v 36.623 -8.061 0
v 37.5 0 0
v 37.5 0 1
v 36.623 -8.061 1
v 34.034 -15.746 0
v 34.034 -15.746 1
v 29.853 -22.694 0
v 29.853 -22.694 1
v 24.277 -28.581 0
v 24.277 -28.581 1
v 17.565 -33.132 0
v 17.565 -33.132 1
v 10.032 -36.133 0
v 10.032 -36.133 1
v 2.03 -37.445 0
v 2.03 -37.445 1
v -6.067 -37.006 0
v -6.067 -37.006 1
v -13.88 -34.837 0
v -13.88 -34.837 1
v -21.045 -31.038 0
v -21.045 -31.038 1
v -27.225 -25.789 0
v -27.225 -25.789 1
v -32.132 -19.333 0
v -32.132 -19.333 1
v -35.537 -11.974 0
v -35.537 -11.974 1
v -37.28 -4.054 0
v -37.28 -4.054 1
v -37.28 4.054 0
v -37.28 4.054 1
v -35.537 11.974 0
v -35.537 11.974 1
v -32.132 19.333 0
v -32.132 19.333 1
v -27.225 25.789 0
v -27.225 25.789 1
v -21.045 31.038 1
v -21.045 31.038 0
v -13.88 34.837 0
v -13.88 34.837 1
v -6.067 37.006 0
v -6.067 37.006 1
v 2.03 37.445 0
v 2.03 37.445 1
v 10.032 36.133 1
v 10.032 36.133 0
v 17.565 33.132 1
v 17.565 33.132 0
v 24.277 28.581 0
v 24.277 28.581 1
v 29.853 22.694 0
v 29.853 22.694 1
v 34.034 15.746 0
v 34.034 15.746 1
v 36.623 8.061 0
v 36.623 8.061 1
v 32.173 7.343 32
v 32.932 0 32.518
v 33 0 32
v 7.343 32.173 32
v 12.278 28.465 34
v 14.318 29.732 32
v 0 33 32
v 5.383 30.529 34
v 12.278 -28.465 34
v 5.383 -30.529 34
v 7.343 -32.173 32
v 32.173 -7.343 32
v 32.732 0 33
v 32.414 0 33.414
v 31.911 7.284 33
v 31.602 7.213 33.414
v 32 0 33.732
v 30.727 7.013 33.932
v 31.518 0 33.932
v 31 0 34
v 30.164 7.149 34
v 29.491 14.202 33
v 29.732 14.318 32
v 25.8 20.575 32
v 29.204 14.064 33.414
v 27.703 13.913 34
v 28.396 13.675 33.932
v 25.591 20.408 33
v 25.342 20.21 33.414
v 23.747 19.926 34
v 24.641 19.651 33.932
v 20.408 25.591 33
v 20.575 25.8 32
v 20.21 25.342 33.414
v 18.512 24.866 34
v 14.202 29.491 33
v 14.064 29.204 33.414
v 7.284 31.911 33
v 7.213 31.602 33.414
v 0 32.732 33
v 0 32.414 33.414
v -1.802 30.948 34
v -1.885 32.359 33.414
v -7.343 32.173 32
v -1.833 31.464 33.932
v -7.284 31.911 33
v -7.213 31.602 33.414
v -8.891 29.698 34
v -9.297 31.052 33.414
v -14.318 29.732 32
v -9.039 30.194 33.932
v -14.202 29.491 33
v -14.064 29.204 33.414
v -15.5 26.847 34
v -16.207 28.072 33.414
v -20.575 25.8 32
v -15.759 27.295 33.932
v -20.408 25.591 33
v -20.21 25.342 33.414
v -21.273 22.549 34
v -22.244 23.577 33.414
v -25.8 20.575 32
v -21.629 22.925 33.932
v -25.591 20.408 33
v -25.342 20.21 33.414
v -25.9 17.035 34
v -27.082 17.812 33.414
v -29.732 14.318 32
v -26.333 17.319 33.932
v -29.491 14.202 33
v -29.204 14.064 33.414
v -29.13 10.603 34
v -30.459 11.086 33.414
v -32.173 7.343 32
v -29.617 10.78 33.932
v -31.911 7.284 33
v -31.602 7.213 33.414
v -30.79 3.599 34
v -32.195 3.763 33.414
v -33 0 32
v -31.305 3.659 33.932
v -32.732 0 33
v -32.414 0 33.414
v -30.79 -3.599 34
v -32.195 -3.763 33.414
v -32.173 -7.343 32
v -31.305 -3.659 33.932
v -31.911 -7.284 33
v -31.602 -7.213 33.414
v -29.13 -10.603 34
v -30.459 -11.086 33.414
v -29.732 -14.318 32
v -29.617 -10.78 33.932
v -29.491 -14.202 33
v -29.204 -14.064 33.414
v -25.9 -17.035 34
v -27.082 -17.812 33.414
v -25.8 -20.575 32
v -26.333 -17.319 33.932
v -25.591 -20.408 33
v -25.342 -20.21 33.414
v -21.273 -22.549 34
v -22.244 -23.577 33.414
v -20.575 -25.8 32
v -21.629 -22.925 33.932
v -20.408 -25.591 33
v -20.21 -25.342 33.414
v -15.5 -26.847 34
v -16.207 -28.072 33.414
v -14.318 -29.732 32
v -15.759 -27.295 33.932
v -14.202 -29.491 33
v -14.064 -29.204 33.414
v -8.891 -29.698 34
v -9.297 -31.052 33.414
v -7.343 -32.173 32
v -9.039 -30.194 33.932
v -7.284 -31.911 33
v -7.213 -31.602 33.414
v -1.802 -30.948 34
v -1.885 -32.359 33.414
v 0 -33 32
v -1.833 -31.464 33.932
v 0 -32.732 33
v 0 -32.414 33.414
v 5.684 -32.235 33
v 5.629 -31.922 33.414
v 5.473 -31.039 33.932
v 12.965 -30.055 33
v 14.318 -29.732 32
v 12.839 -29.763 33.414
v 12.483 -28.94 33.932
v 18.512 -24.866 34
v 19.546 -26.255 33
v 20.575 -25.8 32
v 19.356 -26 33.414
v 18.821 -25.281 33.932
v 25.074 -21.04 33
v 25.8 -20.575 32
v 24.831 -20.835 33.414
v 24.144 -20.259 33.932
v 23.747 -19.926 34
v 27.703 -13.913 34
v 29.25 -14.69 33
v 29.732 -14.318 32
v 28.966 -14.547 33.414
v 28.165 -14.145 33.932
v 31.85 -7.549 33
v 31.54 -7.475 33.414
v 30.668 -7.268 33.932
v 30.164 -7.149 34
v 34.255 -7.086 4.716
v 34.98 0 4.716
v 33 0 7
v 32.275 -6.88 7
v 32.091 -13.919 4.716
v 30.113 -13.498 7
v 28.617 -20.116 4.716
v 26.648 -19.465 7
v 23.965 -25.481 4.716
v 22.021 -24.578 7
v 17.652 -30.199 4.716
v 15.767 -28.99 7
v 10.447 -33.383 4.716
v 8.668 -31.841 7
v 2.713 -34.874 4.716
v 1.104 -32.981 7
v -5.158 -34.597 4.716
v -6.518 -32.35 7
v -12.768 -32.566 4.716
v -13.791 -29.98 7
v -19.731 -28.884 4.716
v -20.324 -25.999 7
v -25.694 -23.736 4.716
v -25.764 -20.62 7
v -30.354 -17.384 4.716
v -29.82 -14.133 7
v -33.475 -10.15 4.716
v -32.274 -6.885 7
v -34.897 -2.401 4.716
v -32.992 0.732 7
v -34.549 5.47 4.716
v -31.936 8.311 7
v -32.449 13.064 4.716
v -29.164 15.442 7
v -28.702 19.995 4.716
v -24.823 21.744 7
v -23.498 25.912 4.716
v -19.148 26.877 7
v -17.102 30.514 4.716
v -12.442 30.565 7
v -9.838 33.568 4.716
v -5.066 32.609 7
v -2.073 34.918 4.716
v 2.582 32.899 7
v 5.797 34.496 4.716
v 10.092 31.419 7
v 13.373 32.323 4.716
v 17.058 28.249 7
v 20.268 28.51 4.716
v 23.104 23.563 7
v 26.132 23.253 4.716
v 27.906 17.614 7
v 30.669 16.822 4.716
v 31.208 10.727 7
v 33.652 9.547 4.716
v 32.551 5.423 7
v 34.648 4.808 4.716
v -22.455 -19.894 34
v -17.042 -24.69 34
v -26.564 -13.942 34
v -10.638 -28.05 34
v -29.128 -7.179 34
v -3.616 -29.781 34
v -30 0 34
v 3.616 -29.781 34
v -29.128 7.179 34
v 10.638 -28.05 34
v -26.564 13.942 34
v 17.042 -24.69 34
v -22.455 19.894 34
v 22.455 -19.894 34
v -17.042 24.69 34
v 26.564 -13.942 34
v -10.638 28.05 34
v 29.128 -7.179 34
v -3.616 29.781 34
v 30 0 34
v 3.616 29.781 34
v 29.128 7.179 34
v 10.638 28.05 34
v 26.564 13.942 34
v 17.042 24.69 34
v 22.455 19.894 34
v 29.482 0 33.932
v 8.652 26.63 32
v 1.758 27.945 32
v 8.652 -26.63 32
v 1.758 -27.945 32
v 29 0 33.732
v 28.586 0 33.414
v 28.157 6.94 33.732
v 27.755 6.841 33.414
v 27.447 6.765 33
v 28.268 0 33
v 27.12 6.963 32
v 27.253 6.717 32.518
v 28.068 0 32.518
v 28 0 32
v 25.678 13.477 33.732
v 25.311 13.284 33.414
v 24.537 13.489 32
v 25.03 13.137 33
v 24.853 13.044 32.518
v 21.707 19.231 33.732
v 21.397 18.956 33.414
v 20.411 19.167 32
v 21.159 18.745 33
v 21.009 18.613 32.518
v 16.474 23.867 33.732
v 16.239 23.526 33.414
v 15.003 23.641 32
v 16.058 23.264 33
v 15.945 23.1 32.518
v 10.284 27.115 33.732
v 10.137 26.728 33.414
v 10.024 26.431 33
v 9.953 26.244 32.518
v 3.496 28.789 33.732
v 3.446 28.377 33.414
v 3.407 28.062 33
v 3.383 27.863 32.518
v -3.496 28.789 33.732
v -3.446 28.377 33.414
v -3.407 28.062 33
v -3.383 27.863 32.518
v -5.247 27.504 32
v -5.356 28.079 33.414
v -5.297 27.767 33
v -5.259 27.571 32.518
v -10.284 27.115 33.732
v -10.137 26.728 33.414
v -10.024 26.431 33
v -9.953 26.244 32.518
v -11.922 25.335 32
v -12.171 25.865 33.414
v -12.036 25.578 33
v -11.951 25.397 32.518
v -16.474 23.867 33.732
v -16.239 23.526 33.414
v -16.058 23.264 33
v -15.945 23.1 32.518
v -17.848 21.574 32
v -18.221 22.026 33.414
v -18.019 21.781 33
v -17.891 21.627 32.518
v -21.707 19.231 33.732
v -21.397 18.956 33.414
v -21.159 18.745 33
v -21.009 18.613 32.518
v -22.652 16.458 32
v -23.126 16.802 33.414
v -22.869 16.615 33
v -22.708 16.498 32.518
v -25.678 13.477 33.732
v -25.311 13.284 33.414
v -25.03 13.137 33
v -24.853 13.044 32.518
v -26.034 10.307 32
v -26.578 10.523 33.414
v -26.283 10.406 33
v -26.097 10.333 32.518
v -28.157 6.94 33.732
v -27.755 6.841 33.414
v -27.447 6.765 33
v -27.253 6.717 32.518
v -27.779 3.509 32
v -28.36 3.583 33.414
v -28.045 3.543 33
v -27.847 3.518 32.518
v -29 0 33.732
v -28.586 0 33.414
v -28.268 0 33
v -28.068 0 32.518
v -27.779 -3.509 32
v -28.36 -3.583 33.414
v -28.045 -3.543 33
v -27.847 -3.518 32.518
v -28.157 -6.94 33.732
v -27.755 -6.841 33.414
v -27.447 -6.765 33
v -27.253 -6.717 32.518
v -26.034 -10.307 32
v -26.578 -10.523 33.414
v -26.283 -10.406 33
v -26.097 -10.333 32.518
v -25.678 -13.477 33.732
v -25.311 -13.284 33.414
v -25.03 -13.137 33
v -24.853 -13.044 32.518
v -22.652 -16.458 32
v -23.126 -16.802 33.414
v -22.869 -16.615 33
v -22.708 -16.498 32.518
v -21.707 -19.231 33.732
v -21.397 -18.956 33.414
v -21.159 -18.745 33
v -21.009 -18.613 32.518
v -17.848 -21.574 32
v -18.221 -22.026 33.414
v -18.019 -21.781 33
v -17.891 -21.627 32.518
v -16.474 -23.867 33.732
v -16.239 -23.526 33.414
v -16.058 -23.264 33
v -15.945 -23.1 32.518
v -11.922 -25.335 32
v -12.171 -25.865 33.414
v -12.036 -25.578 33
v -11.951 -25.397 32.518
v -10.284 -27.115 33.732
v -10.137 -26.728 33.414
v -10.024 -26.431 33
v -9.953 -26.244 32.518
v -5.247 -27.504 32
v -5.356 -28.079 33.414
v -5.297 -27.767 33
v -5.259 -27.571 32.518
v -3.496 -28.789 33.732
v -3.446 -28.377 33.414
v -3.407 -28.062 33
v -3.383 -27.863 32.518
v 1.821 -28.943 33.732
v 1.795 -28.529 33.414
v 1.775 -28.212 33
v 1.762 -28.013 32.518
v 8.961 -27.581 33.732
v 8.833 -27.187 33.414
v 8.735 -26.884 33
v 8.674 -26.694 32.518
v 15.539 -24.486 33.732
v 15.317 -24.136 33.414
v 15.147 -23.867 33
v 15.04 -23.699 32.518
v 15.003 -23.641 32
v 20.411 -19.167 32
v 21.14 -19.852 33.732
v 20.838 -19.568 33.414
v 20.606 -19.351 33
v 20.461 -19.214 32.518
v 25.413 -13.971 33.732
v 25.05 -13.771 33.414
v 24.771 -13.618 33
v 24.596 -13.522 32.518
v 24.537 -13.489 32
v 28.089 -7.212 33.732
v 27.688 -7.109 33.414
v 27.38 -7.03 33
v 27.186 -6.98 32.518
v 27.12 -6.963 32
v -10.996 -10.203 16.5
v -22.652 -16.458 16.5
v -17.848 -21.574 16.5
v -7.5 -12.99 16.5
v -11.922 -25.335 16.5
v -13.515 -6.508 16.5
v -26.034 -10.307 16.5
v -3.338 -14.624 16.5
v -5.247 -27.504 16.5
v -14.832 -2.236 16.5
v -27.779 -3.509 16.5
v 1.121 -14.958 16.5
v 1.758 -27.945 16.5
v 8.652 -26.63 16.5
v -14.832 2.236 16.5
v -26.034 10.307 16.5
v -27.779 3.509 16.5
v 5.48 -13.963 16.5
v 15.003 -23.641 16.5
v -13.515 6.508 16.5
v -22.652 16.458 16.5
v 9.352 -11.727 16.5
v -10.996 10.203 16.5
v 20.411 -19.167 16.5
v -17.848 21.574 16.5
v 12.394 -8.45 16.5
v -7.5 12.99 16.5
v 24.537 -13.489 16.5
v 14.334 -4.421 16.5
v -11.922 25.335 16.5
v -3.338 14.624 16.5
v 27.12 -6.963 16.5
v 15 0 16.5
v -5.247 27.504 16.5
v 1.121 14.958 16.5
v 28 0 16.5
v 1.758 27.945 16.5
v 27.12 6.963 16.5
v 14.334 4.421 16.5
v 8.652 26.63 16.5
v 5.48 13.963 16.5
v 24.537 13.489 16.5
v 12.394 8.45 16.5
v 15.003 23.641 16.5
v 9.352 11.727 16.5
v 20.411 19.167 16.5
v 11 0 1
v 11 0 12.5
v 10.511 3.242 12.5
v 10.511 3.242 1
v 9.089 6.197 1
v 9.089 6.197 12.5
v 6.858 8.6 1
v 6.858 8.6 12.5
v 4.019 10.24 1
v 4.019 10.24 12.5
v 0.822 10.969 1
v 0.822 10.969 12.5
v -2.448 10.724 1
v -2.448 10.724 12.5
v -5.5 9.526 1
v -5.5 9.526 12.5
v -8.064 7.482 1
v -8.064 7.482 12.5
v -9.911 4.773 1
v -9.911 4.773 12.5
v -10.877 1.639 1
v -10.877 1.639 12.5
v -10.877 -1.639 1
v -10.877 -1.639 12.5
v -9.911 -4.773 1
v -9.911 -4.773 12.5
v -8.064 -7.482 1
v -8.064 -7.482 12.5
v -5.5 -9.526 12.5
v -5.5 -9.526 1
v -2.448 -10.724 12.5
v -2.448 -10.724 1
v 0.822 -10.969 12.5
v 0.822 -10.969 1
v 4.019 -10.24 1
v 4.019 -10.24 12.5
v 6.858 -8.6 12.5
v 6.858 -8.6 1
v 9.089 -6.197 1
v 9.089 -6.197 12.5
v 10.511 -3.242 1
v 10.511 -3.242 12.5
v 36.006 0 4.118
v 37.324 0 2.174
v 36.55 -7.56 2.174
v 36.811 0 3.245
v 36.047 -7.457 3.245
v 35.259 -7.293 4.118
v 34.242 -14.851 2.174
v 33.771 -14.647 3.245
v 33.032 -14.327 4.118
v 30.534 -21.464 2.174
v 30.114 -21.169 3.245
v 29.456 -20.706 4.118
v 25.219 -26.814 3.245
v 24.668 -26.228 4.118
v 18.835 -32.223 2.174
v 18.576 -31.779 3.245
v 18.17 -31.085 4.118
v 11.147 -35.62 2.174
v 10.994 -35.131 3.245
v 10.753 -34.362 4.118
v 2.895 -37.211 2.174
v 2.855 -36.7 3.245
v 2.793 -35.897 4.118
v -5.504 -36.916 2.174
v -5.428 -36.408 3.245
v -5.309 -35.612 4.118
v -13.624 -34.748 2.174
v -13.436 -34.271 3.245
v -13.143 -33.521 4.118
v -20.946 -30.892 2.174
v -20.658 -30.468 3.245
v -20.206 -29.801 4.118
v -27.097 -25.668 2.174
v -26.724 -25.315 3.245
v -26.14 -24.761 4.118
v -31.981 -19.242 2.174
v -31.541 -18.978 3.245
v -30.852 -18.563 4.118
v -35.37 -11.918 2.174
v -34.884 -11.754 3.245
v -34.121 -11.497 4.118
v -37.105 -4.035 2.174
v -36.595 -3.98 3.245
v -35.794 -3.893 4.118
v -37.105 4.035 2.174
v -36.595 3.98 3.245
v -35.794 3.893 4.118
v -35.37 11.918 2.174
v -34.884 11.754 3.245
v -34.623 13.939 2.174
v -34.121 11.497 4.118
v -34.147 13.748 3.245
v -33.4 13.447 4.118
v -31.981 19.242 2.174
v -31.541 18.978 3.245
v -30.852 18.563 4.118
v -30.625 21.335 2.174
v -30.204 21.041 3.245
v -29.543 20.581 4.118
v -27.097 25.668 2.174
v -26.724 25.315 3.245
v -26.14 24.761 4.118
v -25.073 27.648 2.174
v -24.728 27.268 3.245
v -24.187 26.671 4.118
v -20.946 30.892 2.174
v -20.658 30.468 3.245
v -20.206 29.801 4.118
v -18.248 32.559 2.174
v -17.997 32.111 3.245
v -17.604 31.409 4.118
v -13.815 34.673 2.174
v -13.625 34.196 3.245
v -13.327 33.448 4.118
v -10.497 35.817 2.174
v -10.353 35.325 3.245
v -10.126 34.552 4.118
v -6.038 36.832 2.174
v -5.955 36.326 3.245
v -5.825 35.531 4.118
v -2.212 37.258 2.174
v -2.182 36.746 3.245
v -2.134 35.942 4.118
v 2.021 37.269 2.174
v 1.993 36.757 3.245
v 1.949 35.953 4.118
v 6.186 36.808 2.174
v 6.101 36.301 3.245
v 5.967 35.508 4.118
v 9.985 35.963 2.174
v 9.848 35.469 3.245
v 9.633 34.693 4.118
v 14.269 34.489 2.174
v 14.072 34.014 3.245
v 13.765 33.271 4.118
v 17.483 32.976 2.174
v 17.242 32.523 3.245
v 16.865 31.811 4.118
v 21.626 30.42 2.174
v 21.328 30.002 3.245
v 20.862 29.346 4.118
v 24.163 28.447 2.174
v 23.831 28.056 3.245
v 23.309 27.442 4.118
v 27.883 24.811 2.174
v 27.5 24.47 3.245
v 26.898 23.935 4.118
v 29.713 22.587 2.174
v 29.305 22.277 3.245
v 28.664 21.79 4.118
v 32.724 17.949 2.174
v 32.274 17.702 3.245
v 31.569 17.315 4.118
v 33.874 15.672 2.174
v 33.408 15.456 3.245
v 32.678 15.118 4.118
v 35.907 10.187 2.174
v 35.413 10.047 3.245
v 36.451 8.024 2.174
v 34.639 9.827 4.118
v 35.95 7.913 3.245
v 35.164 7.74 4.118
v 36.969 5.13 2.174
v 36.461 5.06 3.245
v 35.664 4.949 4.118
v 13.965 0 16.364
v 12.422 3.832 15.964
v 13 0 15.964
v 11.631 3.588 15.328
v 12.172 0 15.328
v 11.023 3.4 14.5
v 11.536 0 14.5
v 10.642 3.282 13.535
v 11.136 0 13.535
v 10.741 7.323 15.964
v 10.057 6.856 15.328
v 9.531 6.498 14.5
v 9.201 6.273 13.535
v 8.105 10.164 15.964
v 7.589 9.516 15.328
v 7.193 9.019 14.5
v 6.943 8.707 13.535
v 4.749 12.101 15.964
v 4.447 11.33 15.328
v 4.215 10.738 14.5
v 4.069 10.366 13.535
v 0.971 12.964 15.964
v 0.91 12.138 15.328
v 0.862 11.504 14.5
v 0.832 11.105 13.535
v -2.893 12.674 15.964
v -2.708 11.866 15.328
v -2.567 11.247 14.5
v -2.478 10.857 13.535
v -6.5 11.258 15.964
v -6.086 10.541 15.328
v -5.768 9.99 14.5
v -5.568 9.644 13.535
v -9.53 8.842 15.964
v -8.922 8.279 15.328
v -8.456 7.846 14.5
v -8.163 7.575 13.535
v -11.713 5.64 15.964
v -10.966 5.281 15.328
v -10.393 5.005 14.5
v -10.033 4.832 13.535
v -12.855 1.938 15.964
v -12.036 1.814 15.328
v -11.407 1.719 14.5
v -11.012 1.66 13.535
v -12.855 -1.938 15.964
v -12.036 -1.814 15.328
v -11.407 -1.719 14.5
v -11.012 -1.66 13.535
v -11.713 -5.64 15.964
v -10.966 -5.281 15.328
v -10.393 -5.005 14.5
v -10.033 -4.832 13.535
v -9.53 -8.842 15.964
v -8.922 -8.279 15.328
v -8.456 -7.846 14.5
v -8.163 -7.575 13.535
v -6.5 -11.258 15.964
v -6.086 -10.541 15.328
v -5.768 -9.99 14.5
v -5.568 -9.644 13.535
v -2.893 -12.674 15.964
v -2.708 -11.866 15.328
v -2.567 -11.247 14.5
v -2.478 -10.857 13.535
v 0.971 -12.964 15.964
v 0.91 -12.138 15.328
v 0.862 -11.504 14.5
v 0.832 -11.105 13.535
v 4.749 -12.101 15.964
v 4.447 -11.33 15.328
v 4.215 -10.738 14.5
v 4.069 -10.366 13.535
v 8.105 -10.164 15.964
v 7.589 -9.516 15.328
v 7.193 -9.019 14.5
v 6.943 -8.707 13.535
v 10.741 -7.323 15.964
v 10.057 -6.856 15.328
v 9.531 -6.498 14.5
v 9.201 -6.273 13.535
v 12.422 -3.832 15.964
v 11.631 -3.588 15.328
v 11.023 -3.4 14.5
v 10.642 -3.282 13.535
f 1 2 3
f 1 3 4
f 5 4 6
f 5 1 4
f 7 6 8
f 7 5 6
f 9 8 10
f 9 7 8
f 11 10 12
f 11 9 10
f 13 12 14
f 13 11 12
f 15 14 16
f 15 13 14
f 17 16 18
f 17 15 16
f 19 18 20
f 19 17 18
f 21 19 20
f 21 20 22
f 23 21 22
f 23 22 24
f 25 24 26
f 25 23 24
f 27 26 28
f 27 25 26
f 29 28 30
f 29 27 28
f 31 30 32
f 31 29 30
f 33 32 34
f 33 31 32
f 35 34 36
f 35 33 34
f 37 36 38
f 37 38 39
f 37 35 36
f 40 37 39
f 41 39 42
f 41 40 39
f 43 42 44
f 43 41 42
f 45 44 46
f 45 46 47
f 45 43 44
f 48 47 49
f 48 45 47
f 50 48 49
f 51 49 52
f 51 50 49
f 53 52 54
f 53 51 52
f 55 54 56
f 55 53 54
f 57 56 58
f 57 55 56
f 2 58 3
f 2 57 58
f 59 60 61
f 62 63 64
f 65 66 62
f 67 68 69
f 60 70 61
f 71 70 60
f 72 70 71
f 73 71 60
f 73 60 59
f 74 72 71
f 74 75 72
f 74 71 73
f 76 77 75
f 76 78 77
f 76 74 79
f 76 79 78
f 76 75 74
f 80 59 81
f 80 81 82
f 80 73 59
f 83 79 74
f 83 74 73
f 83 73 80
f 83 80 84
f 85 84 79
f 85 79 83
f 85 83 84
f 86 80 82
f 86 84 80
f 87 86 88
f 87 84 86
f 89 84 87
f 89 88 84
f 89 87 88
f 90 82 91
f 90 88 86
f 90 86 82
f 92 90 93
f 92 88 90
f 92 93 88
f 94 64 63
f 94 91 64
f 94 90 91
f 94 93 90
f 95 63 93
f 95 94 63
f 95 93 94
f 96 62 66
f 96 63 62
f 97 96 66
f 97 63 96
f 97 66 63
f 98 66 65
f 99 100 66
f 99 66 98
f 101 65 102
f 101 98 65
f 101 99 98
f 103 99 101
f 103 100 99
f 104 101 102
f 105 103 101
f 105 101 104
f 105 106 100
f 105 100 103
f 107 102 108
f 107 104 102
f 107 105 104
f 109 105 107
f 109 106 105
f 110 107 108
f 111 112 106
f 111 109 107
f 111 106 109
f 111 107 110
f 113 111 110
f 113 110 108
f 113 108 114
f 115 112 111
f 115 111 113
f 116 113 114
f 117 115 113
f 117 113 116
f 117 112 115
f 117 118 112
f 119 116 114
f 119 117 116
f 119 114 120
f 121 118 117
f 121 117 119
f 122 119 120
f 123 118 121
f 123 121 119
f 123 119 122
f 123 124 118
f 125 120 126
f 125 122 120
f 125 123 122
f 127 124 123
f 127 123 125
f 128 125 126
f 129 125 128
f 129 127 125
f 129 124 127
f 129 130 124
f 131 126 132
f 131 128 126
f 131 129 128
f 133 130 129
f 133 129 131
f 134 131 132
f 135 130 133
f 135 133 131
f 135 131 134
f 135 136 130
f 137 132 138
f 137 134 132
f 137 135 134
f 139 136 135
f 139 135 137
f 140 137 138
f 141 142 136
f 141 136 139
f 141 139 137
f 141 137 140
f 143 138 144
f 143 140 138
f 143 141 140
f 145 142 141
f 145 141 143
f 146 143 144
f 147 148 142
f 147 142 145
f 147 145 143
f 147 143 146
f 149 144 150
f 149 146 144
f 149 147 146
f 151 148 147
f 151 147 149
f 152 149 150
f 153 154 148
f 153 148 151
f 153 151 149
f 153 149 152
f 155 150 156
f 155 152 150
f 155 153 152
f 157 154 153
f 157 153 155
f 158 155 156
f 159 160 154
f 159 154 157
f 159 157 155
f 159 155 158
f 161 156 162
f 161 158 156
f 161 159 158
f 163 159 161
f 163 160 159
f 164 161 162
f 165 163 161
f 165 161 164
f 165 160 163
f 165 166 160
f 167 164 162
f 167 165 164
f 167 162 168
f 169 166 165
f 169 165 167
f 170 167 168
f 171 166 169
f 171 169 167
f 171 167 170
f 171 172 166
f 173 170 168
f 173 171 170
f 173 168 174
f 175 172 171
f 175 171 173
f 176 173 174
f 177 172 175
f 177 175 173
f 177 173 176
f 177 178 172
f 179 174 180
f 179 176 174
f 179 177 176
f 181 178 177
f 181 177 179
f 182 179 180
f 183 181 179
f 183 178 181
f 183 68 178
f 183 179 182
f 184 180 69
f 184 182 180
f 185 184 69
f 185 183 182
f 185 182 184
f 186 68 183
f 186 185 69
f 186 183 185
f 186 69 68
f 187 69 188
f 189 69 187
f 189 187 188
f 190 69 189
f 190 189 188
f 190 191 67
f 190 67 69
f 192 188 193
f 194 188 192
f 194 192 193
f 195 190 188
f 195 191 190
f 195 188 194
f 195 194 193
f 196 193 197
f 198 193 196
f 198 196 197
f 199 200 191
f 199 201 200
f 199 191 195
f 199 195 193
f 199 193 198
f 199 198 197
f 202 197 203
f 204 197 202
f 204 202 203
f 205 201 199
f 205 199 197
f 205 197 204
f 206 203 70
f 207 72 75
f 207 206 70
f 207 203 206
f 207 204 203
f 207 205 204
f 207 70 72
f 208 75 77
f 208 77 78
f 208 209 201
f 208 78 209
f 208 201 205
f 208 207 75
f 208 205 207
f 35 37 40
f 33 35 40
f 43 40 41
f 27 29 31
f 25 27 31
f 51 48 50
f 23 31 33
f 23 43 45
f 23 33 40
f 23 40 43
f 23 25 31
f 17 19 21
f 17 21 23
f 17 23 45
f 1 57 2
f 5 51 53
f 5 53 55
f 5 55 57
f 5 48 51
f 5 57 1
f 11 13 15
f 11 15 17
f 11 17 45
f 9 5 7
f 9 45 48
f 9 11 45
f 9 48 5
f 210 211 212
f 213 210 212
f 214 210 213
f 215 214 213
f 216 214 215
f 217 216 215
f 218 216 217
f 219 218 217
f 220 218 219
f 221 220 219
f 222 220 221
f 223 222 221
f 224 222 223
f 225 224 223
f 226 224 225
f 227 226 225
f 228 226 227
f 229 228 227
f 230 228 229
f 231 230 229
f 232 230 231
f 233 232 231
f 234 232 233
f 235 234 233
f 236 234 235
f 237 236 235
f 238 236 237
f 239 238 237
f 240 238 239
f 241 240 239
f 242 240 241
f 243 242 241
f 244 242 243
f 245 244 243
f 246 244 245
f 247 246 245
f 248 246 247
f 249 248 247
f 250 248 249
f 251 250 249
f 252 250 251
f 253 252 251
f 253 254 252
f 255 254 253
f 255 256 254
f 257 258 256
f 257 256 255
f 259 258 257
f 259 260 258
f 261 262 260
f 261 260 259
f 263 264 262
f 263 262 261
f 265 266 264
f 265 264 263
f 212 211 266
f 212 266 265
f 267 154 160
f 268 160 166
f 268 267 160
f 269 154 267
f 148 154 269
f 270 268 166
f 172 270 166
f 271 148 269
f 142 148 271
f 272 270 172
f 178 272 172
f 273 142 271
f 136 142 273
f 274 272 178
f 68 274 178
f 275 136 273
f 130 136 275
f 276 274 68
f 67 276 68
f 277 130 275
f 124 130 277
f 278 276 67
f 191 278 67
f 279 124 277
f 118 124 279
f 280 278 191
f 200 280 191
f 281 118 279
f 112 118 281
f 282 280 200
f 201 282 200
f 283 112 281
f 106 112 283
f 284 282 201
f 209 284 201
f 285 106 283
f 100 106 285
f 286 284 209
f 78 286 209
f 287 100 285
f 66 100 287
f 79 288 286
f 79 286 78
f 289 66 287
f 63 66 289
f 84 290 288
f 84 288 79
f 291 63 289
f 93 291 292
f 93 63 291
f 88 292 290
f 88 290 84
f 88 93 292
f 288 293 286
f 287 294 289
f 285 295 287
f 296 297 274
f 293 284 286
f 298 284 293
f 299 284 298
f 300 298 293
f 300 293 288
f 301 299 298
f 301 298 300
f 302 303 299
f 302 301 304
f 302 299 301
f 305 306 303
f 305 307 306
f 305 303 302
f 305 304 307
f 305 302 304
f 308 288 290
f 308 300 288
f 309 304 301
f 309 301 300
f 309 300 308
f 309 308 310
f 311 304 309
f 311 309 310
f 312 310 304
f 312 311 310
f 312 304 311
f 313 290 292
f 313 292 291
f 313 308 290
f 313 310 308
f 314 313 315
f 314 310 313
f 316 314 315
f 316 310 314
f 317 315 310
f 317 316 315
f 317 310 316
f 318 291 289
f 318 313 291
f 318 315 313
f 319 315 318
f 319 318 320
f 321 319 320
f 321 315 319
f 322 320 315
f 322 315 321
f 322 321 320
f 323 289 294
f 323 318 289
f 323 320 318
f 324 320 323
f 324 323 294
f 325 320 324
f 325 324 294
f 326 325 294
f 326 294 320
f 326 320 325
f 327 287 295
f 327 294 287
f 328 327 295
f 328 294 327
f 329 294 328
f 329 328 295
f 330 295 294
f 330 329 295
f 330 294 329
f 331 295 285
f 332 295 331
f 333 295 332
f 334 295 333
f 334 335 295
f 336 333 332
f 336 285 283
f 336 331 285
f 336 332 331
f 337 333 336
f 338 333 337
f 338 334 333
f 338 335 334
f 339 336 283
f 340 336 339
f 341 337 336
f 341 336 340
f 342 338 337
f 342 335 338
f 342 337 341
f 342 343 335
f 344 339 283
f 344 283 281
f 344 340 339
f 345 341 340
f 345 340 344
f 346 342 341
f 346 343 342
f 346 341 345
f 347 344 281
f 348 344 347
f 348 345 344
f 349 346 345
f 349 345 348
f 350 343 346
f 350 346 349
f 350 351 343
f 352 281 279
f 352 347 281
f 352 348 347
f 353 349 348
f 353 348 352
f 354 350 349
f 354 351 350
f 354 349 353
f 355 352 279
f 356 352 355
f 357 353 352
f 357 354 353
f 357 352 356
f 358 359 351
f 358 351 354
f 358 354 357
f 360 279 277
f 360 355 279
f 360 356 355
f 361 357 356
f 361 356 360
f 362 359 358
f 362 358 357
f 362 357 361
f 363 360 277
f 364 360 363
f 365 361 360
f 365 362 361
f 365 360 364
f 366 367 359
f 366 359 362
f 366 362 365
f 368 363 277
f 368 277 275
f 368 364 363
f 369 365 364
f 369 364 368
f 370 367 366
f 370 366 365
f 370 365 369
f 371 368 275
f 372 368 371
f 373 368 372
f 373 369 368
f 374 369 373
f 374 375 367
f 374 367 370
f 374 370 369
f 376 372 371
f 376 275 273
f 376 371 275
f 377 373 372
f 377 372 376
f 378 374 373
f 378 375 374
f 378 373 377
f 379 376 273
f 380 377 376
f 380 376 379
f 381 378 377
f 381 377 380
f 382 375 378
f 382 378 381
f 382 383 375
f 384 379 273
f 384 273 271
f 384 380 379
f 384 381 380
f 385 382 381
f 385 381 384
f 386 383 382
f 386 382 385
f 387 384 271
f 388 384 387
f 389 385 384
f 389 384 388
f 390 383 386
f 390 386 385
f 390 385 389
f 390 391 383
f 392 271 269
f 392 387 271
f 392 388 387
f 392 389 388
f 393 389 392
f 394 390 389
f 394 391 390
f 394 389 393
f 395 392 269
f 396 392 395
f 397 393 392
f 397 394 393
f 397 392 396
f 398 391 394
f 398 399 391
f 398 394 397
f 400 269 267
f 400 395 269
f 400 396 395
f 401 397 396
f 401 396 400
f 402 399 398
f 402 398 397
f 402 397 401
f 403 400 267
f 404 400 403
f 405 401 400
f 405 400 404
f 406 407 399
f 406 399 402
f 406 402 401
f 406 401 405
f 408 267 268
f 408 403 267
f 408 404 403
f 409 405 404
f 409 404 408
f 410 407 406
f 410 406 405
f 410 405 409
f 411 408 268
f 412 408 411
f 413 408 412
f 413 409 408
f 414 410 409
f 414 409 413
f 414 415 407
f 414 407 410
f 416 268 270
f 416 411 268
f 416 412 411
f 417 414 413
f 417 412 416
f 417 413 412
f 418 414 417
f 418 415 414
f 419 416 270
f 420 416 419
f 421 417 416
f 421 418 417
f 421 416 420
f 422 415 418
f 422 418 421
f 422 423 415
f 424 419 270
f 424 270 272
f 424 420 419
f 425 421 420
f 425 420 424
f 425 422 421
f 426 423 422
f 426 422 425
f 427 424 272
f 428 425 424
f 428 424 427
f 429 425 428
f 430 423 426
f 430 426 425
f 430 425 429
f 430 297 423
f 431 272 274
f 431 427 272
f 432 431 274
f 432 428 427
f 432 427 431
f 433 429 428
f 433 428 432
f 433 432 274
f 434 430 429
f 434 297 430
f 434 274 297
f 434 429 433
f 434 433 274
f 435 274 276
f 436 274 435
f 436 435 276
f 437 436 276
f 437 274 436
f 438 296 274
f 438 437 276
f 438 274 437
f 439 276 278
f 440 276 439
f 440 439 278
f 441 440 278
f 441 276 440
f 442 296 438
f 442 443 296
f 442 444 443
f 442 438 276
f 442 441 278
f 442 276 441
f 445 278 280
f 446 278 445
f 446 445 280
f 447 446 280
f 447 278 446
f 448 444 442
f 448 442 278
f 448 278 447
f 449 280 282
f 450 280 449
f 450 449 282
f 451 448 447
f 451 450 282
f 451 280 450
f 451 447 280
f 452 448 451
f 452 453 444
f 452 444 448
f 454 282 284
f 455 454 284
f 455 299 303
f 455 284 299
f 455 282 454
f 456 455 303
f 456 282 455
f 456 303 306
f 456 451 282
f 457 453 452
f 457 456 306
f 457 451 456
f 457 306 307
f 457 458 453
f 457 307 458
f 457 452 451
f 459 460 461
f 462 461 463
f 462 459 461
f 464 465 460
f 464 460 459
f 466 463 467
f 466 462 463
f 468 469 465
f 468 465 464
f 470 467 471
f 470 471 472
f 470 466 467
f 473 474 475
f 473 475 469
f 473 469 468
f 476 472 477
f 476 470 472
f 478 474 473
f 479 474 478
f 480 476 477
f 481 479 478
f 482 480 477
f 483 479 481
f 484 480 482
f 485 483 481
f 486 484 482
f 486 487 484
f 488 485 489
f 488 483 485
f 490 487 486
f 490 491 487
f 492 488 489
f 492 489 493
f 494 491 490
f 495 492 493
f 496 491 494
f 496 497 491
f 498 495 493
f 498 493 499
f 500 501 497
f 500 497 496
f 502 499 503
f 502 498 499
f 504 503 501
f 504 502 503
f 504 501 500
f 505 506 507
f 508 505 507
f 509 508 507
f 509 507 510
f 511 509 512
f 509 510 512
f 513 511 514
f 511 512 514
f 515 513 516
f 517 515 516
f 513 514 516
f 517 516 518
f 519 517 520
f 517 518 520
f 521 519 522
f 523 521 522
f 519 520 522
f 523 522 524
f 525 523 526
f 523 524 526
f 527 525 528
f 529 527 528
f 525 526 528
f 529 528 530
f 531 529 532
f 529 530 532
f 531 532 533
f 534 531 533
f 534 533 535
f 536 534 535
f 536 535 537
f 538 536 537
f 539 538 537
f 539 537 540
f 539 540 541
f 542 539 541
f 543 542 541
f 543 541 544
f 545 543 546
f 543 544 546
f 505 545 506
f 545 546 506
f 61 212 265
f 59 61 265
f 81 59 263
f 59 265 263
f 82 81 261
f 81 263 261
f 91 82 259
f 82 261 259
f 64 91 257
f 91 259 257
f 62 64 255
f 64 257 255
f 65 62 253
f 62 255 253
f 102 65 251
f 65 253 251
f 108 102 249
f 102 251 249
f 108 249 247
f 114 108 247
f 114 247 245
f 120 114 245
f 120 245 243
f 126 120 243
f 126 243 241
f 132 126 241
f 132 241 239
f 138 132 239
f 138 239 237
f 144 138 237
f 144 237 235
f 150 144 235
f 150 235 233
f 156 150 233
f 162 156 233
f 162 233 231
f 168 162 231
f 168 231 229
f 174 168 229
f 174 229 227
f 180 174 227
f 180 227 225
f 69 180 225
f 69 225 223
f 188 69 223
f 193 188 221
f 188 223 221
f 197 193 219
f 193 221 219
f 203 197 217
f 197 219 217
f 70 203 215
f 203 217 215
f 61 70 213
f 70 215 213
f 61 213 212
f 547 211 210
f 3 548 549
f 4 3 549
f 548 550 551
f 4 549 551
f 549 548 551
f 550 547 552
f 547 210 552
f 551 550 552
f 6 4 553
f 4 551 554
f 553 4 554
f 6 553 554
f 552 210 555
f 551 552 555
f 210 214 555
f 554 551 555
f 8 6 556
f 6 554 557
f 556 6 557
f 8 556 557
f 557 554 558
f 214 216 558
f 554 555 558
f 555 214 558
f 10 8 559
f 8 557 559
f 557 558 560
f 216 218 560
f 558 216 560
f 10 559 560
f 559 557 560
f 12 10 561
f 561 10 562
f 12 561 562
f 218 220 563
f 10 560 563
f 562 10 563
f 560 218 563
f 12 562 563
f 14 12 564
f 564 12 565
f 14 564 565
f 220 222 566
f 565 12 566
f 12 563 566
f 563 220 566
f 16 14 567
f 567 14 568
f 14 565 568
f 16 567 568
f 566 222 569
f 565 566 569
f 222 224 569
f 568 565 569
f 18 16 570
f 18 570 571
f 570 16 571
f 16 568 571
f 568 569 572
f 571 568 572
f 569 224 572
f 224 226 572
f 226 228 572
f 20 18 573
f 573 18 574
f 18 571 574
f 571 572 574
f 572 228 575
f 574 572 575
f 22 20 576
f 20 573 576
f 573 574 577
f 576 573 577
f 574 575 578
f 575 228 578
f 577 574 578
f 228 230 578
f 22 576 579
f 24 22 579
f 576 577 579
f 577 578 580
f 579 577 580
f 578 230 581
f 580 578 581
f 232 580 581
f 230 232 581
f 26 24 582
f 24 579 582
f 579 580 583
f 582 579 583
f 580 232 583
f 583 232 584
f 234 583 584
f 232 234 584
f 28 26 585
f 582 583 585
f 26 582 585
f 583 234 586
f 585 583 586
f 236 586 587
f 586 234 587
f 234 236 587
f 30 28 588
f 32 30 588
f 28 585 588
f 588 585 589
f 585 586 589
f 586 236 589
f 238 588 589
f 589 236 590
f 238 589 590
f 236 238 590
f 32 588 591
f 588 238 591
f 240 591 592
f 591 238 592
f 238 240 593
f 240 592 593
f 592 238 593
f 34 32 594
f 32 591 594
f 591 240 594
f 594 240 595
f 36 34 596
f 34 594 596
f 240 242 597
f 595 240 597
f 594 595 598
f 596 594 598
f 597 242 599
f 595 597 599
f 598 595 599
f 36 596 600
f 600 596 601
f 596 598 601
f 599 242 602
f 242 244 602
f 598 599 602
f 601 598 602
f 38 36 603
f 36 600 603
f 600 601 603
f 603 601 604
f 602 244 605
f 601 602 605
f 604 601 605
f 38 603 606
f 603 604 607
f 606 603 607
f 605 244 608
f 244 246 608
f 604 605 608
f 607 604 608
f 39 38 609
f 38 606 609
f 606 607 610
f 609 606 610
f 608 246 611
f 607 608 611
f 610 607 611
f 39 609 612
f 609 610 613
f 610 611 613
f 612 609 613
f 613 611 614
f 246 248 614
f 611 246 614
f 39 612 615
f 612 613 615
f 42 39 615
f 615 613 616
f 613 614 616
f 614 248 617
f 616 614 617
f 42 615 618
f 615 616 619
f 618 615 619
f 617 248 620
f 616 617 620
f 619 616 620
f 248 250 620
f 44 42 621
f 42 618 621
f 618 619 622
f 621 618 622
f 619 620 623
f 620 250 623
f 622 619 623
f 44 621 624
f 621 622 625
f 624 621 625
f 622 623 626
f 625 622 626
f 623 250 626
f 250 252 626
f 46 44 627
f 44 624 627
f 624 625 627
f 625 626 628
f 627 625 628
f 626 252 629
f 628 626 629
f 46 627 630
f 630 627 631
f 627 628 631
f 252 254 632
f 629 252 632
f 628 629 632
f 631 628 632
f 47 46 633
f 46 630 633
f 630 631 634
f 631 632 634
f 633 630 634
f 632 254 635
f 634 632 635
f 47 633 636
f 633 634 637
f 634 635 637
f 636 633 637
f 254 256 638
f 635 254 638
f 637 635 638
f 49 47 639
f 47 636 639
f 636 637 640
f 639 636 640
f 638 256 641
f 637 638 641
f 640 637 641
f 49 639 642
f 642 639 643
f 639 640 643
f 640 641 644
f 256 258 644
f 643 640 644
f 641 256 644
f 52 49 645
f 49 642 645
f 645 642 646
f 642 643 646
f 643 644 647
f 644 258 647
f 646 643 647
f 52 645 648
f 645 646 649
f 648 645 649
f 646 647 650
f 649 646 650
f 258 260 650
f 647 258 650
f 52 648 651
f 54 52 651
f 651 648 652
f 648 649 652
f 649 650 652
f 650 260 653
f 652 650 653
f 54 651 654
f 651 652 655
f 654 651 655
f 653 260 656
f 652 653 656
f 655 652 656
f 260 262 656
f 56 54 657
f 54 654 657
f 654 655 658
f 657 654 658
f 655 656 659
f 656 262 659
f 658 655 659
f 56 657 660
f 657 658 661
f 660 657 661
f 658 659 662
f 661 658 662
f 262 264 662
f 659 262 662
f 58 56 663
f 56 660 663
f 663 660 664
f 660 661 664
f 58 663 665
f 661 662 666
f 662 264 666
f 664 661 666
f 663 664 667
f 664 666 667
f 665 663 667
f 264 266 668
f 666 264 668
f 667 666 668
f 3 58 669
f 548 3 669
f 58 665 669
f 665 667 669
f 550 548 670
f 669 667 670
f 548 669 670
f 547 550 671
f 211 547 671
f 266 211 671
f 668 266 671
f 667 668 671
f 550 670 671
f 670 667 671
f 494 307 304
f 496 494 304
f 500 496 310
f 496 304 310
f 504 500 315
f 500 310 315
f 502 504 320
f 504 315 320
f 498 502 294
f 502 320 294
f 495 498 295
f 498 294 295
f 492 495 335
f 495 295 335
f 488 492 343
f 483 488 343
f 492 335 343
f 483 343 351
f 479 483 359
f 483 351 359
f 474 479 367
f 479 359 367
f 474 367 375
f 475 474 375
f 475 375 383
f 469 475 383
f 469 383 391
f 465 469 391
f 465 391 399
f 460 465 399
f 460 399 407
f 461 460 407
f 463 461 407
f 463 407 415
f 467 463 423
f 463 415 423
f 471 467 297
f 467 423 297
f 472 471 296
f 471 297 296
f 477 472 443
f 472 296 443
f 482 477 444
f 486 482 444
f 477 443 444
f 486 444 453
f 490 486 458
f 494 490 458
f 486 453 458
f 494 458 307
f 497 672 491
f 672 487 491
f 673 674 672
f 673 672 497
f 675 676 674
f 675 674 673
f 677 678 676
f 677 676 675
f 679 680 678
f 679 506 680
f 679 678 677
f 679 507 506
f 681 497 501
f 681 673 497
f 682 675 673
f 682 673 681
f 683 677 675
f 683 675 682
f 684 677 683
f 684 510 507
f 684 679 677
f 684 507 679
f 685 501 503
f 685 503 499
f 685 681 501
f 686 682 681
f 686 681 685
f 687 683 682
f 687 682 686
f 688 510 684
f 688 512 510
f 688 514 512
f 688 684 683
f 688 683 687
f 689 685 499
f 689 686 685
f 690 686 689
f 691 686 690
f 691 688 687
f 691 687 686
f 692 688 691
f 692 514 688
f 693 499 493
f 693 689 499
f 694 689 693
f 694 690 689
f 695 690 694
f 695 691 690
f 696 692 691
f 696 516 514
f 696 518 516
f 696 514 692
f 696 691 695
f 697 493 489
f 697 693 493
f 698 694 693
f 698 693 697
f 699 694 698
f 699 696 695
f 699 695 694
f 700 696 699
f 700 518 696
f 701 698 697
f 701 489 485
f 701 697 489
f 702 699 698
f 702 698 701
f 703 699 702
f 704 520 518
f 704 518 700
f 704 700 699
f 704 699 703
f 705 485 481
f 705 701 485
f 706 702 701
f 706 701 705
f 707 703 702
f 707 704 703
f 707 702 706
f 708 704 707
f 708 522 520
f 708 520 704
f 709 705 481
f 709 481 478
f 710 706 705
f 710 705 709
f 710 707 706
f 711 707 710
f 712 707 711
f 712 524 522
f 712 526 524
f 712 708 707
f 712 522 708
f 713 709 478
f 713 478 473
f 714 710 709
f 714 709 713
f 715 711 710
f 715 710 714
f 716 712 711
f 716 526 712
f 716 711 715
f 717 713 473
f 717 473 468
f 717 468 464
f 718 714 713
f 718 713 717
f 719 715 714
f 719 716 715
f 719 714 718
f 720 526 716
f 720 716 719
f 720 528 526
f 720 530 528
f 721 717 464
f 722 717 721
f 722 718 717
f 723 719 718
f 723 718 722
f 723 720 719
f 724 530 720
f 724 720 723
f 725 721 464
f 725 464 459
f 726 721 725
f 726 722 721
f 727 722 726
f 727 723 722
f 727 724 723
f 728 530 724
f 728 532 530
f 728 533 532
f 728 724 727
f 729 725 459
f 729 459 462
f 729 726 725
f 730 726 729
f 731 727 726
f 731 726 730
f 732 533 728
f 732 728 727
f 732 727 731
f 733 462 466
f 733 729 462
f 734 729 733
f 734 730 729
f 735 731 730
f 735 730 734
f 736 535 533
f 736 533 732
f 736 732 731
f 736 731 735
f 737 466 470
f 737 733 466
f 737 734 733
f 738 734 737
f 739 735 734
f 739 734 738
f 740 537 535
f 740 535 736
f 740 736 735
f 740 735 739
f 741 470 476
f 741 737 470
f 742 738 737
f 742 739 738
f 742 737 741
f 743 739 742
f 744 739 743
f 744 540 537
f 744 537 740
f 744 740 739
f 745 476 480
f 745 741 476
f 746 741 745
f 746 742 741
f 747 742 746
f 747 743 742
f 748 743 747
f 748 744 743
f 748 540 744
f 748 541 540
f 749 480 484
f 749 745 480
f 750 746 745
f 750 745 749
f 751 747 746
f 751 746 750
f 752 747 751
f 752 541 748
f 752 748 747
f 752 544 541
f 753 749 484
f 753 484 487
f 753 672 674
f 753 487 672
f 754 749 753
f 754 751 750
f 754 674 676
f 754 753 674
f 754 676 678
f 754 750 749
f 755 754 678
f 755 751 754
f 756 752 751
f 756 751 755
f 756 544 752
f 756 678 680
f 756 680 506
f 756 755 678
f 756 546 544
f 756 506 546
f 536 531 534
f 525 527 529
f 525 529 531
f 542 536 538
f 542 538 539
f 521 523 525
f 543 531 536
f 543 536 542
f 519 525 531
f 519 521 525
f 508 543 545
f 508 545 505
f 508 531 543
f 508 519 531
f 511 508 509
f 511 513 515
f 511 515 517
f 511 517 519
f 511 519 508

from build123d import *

# Parameters (mm, degrees)
SKETCH_R        = 33
PAD_DEPTH       = 34
SKETCH001_R     = 28
POCKET_DEPTH    = 17.5
SKETCH002_R     = 11
POCKET001_DEPTH = 15.5
SKETCH003_R     = 37.5
SKETCH003_R_2   = 25
PAD001_DEPTH    = 5
FILLET_R        = 4
CHAMFER_SIZE    = 2
FILLET001_R     = 2
FILLET002_R     = 2
FILLET003_R     = 4


with BuildPart() as part:
    # Sketch → Pad (new body)
    with BuildSketch(Plane.XY):
        Circle(SKETCH_R)
    extrude(amount=PAD_DEPTH)

    # Sketch001 (on Face3 of Pad) → Pocket (cut)
    with BuildSketch(Plane.XY.offset(34)):
        Circle(SKETCH001_R)
    extrude(amount=-POCKET_DEPTH, mode=Mode.SUBTRACT)

    # Sketch002 (on Face5 of Pocket) → Pocket001 (cut)
    with BuildSketch(Plane.XY.offset(16.5)):
        Circle(SKETCH002_R)
    extrude(amount=-POCKET001_DEPTH, mode=Mode.SUBTRACT)

    # Sketch003 (on Face2 of Pocket001) → Pad001 (join)
    with BuildSketch(Plane(origin=(0, 0, 0), x_dir=(1, 0, 0), z_dir=(0, 0, -1))):
        Circle(SKETCH003_R)
        Circle(SKETCH003_R_2, mode=Mode.SUBTRACT)
    extrude(amount=-PAD001_DEPTH)

    # Fillet
    fillet_edges = [part.edges().sort_by_distance(p)[0] for p in [
        (-37.5, 0, 5),
    ]]
    fillet(fillet_edges, radius=FILLET_R)

    # Chamfer
    chamfer_edges = [part.edges().sort_by_distance(p)[0] for p in [
        (-33, 0, 5),
    ]]
    chamfer(chamfer_edges, length=CHAMFER_SIZE)

    # Fillet001
    fillet001_edges = [part.edges().sort_by_distance(p)[0] for p in [
        (-33, 0, 34),
    ]]
    fillet(fillet001_edges, radius=FILLET001_R)

    # Fillet002
    fillet002_edges = [part.edges().sort_by_distance(p)[0] for p in [
        (-28, 0, 34),
    ]]
    fillet(fillet002_edges, radius=FILLET002_R)

    # Fillet003
    fillet003_edges = [part.edges().sort_by_distance(p)[0] for p in [
        (-11, 0, 16.5),
    ]]
    fillet(fillet003_edges, radius=FILLET003_R)


solid = part.part
